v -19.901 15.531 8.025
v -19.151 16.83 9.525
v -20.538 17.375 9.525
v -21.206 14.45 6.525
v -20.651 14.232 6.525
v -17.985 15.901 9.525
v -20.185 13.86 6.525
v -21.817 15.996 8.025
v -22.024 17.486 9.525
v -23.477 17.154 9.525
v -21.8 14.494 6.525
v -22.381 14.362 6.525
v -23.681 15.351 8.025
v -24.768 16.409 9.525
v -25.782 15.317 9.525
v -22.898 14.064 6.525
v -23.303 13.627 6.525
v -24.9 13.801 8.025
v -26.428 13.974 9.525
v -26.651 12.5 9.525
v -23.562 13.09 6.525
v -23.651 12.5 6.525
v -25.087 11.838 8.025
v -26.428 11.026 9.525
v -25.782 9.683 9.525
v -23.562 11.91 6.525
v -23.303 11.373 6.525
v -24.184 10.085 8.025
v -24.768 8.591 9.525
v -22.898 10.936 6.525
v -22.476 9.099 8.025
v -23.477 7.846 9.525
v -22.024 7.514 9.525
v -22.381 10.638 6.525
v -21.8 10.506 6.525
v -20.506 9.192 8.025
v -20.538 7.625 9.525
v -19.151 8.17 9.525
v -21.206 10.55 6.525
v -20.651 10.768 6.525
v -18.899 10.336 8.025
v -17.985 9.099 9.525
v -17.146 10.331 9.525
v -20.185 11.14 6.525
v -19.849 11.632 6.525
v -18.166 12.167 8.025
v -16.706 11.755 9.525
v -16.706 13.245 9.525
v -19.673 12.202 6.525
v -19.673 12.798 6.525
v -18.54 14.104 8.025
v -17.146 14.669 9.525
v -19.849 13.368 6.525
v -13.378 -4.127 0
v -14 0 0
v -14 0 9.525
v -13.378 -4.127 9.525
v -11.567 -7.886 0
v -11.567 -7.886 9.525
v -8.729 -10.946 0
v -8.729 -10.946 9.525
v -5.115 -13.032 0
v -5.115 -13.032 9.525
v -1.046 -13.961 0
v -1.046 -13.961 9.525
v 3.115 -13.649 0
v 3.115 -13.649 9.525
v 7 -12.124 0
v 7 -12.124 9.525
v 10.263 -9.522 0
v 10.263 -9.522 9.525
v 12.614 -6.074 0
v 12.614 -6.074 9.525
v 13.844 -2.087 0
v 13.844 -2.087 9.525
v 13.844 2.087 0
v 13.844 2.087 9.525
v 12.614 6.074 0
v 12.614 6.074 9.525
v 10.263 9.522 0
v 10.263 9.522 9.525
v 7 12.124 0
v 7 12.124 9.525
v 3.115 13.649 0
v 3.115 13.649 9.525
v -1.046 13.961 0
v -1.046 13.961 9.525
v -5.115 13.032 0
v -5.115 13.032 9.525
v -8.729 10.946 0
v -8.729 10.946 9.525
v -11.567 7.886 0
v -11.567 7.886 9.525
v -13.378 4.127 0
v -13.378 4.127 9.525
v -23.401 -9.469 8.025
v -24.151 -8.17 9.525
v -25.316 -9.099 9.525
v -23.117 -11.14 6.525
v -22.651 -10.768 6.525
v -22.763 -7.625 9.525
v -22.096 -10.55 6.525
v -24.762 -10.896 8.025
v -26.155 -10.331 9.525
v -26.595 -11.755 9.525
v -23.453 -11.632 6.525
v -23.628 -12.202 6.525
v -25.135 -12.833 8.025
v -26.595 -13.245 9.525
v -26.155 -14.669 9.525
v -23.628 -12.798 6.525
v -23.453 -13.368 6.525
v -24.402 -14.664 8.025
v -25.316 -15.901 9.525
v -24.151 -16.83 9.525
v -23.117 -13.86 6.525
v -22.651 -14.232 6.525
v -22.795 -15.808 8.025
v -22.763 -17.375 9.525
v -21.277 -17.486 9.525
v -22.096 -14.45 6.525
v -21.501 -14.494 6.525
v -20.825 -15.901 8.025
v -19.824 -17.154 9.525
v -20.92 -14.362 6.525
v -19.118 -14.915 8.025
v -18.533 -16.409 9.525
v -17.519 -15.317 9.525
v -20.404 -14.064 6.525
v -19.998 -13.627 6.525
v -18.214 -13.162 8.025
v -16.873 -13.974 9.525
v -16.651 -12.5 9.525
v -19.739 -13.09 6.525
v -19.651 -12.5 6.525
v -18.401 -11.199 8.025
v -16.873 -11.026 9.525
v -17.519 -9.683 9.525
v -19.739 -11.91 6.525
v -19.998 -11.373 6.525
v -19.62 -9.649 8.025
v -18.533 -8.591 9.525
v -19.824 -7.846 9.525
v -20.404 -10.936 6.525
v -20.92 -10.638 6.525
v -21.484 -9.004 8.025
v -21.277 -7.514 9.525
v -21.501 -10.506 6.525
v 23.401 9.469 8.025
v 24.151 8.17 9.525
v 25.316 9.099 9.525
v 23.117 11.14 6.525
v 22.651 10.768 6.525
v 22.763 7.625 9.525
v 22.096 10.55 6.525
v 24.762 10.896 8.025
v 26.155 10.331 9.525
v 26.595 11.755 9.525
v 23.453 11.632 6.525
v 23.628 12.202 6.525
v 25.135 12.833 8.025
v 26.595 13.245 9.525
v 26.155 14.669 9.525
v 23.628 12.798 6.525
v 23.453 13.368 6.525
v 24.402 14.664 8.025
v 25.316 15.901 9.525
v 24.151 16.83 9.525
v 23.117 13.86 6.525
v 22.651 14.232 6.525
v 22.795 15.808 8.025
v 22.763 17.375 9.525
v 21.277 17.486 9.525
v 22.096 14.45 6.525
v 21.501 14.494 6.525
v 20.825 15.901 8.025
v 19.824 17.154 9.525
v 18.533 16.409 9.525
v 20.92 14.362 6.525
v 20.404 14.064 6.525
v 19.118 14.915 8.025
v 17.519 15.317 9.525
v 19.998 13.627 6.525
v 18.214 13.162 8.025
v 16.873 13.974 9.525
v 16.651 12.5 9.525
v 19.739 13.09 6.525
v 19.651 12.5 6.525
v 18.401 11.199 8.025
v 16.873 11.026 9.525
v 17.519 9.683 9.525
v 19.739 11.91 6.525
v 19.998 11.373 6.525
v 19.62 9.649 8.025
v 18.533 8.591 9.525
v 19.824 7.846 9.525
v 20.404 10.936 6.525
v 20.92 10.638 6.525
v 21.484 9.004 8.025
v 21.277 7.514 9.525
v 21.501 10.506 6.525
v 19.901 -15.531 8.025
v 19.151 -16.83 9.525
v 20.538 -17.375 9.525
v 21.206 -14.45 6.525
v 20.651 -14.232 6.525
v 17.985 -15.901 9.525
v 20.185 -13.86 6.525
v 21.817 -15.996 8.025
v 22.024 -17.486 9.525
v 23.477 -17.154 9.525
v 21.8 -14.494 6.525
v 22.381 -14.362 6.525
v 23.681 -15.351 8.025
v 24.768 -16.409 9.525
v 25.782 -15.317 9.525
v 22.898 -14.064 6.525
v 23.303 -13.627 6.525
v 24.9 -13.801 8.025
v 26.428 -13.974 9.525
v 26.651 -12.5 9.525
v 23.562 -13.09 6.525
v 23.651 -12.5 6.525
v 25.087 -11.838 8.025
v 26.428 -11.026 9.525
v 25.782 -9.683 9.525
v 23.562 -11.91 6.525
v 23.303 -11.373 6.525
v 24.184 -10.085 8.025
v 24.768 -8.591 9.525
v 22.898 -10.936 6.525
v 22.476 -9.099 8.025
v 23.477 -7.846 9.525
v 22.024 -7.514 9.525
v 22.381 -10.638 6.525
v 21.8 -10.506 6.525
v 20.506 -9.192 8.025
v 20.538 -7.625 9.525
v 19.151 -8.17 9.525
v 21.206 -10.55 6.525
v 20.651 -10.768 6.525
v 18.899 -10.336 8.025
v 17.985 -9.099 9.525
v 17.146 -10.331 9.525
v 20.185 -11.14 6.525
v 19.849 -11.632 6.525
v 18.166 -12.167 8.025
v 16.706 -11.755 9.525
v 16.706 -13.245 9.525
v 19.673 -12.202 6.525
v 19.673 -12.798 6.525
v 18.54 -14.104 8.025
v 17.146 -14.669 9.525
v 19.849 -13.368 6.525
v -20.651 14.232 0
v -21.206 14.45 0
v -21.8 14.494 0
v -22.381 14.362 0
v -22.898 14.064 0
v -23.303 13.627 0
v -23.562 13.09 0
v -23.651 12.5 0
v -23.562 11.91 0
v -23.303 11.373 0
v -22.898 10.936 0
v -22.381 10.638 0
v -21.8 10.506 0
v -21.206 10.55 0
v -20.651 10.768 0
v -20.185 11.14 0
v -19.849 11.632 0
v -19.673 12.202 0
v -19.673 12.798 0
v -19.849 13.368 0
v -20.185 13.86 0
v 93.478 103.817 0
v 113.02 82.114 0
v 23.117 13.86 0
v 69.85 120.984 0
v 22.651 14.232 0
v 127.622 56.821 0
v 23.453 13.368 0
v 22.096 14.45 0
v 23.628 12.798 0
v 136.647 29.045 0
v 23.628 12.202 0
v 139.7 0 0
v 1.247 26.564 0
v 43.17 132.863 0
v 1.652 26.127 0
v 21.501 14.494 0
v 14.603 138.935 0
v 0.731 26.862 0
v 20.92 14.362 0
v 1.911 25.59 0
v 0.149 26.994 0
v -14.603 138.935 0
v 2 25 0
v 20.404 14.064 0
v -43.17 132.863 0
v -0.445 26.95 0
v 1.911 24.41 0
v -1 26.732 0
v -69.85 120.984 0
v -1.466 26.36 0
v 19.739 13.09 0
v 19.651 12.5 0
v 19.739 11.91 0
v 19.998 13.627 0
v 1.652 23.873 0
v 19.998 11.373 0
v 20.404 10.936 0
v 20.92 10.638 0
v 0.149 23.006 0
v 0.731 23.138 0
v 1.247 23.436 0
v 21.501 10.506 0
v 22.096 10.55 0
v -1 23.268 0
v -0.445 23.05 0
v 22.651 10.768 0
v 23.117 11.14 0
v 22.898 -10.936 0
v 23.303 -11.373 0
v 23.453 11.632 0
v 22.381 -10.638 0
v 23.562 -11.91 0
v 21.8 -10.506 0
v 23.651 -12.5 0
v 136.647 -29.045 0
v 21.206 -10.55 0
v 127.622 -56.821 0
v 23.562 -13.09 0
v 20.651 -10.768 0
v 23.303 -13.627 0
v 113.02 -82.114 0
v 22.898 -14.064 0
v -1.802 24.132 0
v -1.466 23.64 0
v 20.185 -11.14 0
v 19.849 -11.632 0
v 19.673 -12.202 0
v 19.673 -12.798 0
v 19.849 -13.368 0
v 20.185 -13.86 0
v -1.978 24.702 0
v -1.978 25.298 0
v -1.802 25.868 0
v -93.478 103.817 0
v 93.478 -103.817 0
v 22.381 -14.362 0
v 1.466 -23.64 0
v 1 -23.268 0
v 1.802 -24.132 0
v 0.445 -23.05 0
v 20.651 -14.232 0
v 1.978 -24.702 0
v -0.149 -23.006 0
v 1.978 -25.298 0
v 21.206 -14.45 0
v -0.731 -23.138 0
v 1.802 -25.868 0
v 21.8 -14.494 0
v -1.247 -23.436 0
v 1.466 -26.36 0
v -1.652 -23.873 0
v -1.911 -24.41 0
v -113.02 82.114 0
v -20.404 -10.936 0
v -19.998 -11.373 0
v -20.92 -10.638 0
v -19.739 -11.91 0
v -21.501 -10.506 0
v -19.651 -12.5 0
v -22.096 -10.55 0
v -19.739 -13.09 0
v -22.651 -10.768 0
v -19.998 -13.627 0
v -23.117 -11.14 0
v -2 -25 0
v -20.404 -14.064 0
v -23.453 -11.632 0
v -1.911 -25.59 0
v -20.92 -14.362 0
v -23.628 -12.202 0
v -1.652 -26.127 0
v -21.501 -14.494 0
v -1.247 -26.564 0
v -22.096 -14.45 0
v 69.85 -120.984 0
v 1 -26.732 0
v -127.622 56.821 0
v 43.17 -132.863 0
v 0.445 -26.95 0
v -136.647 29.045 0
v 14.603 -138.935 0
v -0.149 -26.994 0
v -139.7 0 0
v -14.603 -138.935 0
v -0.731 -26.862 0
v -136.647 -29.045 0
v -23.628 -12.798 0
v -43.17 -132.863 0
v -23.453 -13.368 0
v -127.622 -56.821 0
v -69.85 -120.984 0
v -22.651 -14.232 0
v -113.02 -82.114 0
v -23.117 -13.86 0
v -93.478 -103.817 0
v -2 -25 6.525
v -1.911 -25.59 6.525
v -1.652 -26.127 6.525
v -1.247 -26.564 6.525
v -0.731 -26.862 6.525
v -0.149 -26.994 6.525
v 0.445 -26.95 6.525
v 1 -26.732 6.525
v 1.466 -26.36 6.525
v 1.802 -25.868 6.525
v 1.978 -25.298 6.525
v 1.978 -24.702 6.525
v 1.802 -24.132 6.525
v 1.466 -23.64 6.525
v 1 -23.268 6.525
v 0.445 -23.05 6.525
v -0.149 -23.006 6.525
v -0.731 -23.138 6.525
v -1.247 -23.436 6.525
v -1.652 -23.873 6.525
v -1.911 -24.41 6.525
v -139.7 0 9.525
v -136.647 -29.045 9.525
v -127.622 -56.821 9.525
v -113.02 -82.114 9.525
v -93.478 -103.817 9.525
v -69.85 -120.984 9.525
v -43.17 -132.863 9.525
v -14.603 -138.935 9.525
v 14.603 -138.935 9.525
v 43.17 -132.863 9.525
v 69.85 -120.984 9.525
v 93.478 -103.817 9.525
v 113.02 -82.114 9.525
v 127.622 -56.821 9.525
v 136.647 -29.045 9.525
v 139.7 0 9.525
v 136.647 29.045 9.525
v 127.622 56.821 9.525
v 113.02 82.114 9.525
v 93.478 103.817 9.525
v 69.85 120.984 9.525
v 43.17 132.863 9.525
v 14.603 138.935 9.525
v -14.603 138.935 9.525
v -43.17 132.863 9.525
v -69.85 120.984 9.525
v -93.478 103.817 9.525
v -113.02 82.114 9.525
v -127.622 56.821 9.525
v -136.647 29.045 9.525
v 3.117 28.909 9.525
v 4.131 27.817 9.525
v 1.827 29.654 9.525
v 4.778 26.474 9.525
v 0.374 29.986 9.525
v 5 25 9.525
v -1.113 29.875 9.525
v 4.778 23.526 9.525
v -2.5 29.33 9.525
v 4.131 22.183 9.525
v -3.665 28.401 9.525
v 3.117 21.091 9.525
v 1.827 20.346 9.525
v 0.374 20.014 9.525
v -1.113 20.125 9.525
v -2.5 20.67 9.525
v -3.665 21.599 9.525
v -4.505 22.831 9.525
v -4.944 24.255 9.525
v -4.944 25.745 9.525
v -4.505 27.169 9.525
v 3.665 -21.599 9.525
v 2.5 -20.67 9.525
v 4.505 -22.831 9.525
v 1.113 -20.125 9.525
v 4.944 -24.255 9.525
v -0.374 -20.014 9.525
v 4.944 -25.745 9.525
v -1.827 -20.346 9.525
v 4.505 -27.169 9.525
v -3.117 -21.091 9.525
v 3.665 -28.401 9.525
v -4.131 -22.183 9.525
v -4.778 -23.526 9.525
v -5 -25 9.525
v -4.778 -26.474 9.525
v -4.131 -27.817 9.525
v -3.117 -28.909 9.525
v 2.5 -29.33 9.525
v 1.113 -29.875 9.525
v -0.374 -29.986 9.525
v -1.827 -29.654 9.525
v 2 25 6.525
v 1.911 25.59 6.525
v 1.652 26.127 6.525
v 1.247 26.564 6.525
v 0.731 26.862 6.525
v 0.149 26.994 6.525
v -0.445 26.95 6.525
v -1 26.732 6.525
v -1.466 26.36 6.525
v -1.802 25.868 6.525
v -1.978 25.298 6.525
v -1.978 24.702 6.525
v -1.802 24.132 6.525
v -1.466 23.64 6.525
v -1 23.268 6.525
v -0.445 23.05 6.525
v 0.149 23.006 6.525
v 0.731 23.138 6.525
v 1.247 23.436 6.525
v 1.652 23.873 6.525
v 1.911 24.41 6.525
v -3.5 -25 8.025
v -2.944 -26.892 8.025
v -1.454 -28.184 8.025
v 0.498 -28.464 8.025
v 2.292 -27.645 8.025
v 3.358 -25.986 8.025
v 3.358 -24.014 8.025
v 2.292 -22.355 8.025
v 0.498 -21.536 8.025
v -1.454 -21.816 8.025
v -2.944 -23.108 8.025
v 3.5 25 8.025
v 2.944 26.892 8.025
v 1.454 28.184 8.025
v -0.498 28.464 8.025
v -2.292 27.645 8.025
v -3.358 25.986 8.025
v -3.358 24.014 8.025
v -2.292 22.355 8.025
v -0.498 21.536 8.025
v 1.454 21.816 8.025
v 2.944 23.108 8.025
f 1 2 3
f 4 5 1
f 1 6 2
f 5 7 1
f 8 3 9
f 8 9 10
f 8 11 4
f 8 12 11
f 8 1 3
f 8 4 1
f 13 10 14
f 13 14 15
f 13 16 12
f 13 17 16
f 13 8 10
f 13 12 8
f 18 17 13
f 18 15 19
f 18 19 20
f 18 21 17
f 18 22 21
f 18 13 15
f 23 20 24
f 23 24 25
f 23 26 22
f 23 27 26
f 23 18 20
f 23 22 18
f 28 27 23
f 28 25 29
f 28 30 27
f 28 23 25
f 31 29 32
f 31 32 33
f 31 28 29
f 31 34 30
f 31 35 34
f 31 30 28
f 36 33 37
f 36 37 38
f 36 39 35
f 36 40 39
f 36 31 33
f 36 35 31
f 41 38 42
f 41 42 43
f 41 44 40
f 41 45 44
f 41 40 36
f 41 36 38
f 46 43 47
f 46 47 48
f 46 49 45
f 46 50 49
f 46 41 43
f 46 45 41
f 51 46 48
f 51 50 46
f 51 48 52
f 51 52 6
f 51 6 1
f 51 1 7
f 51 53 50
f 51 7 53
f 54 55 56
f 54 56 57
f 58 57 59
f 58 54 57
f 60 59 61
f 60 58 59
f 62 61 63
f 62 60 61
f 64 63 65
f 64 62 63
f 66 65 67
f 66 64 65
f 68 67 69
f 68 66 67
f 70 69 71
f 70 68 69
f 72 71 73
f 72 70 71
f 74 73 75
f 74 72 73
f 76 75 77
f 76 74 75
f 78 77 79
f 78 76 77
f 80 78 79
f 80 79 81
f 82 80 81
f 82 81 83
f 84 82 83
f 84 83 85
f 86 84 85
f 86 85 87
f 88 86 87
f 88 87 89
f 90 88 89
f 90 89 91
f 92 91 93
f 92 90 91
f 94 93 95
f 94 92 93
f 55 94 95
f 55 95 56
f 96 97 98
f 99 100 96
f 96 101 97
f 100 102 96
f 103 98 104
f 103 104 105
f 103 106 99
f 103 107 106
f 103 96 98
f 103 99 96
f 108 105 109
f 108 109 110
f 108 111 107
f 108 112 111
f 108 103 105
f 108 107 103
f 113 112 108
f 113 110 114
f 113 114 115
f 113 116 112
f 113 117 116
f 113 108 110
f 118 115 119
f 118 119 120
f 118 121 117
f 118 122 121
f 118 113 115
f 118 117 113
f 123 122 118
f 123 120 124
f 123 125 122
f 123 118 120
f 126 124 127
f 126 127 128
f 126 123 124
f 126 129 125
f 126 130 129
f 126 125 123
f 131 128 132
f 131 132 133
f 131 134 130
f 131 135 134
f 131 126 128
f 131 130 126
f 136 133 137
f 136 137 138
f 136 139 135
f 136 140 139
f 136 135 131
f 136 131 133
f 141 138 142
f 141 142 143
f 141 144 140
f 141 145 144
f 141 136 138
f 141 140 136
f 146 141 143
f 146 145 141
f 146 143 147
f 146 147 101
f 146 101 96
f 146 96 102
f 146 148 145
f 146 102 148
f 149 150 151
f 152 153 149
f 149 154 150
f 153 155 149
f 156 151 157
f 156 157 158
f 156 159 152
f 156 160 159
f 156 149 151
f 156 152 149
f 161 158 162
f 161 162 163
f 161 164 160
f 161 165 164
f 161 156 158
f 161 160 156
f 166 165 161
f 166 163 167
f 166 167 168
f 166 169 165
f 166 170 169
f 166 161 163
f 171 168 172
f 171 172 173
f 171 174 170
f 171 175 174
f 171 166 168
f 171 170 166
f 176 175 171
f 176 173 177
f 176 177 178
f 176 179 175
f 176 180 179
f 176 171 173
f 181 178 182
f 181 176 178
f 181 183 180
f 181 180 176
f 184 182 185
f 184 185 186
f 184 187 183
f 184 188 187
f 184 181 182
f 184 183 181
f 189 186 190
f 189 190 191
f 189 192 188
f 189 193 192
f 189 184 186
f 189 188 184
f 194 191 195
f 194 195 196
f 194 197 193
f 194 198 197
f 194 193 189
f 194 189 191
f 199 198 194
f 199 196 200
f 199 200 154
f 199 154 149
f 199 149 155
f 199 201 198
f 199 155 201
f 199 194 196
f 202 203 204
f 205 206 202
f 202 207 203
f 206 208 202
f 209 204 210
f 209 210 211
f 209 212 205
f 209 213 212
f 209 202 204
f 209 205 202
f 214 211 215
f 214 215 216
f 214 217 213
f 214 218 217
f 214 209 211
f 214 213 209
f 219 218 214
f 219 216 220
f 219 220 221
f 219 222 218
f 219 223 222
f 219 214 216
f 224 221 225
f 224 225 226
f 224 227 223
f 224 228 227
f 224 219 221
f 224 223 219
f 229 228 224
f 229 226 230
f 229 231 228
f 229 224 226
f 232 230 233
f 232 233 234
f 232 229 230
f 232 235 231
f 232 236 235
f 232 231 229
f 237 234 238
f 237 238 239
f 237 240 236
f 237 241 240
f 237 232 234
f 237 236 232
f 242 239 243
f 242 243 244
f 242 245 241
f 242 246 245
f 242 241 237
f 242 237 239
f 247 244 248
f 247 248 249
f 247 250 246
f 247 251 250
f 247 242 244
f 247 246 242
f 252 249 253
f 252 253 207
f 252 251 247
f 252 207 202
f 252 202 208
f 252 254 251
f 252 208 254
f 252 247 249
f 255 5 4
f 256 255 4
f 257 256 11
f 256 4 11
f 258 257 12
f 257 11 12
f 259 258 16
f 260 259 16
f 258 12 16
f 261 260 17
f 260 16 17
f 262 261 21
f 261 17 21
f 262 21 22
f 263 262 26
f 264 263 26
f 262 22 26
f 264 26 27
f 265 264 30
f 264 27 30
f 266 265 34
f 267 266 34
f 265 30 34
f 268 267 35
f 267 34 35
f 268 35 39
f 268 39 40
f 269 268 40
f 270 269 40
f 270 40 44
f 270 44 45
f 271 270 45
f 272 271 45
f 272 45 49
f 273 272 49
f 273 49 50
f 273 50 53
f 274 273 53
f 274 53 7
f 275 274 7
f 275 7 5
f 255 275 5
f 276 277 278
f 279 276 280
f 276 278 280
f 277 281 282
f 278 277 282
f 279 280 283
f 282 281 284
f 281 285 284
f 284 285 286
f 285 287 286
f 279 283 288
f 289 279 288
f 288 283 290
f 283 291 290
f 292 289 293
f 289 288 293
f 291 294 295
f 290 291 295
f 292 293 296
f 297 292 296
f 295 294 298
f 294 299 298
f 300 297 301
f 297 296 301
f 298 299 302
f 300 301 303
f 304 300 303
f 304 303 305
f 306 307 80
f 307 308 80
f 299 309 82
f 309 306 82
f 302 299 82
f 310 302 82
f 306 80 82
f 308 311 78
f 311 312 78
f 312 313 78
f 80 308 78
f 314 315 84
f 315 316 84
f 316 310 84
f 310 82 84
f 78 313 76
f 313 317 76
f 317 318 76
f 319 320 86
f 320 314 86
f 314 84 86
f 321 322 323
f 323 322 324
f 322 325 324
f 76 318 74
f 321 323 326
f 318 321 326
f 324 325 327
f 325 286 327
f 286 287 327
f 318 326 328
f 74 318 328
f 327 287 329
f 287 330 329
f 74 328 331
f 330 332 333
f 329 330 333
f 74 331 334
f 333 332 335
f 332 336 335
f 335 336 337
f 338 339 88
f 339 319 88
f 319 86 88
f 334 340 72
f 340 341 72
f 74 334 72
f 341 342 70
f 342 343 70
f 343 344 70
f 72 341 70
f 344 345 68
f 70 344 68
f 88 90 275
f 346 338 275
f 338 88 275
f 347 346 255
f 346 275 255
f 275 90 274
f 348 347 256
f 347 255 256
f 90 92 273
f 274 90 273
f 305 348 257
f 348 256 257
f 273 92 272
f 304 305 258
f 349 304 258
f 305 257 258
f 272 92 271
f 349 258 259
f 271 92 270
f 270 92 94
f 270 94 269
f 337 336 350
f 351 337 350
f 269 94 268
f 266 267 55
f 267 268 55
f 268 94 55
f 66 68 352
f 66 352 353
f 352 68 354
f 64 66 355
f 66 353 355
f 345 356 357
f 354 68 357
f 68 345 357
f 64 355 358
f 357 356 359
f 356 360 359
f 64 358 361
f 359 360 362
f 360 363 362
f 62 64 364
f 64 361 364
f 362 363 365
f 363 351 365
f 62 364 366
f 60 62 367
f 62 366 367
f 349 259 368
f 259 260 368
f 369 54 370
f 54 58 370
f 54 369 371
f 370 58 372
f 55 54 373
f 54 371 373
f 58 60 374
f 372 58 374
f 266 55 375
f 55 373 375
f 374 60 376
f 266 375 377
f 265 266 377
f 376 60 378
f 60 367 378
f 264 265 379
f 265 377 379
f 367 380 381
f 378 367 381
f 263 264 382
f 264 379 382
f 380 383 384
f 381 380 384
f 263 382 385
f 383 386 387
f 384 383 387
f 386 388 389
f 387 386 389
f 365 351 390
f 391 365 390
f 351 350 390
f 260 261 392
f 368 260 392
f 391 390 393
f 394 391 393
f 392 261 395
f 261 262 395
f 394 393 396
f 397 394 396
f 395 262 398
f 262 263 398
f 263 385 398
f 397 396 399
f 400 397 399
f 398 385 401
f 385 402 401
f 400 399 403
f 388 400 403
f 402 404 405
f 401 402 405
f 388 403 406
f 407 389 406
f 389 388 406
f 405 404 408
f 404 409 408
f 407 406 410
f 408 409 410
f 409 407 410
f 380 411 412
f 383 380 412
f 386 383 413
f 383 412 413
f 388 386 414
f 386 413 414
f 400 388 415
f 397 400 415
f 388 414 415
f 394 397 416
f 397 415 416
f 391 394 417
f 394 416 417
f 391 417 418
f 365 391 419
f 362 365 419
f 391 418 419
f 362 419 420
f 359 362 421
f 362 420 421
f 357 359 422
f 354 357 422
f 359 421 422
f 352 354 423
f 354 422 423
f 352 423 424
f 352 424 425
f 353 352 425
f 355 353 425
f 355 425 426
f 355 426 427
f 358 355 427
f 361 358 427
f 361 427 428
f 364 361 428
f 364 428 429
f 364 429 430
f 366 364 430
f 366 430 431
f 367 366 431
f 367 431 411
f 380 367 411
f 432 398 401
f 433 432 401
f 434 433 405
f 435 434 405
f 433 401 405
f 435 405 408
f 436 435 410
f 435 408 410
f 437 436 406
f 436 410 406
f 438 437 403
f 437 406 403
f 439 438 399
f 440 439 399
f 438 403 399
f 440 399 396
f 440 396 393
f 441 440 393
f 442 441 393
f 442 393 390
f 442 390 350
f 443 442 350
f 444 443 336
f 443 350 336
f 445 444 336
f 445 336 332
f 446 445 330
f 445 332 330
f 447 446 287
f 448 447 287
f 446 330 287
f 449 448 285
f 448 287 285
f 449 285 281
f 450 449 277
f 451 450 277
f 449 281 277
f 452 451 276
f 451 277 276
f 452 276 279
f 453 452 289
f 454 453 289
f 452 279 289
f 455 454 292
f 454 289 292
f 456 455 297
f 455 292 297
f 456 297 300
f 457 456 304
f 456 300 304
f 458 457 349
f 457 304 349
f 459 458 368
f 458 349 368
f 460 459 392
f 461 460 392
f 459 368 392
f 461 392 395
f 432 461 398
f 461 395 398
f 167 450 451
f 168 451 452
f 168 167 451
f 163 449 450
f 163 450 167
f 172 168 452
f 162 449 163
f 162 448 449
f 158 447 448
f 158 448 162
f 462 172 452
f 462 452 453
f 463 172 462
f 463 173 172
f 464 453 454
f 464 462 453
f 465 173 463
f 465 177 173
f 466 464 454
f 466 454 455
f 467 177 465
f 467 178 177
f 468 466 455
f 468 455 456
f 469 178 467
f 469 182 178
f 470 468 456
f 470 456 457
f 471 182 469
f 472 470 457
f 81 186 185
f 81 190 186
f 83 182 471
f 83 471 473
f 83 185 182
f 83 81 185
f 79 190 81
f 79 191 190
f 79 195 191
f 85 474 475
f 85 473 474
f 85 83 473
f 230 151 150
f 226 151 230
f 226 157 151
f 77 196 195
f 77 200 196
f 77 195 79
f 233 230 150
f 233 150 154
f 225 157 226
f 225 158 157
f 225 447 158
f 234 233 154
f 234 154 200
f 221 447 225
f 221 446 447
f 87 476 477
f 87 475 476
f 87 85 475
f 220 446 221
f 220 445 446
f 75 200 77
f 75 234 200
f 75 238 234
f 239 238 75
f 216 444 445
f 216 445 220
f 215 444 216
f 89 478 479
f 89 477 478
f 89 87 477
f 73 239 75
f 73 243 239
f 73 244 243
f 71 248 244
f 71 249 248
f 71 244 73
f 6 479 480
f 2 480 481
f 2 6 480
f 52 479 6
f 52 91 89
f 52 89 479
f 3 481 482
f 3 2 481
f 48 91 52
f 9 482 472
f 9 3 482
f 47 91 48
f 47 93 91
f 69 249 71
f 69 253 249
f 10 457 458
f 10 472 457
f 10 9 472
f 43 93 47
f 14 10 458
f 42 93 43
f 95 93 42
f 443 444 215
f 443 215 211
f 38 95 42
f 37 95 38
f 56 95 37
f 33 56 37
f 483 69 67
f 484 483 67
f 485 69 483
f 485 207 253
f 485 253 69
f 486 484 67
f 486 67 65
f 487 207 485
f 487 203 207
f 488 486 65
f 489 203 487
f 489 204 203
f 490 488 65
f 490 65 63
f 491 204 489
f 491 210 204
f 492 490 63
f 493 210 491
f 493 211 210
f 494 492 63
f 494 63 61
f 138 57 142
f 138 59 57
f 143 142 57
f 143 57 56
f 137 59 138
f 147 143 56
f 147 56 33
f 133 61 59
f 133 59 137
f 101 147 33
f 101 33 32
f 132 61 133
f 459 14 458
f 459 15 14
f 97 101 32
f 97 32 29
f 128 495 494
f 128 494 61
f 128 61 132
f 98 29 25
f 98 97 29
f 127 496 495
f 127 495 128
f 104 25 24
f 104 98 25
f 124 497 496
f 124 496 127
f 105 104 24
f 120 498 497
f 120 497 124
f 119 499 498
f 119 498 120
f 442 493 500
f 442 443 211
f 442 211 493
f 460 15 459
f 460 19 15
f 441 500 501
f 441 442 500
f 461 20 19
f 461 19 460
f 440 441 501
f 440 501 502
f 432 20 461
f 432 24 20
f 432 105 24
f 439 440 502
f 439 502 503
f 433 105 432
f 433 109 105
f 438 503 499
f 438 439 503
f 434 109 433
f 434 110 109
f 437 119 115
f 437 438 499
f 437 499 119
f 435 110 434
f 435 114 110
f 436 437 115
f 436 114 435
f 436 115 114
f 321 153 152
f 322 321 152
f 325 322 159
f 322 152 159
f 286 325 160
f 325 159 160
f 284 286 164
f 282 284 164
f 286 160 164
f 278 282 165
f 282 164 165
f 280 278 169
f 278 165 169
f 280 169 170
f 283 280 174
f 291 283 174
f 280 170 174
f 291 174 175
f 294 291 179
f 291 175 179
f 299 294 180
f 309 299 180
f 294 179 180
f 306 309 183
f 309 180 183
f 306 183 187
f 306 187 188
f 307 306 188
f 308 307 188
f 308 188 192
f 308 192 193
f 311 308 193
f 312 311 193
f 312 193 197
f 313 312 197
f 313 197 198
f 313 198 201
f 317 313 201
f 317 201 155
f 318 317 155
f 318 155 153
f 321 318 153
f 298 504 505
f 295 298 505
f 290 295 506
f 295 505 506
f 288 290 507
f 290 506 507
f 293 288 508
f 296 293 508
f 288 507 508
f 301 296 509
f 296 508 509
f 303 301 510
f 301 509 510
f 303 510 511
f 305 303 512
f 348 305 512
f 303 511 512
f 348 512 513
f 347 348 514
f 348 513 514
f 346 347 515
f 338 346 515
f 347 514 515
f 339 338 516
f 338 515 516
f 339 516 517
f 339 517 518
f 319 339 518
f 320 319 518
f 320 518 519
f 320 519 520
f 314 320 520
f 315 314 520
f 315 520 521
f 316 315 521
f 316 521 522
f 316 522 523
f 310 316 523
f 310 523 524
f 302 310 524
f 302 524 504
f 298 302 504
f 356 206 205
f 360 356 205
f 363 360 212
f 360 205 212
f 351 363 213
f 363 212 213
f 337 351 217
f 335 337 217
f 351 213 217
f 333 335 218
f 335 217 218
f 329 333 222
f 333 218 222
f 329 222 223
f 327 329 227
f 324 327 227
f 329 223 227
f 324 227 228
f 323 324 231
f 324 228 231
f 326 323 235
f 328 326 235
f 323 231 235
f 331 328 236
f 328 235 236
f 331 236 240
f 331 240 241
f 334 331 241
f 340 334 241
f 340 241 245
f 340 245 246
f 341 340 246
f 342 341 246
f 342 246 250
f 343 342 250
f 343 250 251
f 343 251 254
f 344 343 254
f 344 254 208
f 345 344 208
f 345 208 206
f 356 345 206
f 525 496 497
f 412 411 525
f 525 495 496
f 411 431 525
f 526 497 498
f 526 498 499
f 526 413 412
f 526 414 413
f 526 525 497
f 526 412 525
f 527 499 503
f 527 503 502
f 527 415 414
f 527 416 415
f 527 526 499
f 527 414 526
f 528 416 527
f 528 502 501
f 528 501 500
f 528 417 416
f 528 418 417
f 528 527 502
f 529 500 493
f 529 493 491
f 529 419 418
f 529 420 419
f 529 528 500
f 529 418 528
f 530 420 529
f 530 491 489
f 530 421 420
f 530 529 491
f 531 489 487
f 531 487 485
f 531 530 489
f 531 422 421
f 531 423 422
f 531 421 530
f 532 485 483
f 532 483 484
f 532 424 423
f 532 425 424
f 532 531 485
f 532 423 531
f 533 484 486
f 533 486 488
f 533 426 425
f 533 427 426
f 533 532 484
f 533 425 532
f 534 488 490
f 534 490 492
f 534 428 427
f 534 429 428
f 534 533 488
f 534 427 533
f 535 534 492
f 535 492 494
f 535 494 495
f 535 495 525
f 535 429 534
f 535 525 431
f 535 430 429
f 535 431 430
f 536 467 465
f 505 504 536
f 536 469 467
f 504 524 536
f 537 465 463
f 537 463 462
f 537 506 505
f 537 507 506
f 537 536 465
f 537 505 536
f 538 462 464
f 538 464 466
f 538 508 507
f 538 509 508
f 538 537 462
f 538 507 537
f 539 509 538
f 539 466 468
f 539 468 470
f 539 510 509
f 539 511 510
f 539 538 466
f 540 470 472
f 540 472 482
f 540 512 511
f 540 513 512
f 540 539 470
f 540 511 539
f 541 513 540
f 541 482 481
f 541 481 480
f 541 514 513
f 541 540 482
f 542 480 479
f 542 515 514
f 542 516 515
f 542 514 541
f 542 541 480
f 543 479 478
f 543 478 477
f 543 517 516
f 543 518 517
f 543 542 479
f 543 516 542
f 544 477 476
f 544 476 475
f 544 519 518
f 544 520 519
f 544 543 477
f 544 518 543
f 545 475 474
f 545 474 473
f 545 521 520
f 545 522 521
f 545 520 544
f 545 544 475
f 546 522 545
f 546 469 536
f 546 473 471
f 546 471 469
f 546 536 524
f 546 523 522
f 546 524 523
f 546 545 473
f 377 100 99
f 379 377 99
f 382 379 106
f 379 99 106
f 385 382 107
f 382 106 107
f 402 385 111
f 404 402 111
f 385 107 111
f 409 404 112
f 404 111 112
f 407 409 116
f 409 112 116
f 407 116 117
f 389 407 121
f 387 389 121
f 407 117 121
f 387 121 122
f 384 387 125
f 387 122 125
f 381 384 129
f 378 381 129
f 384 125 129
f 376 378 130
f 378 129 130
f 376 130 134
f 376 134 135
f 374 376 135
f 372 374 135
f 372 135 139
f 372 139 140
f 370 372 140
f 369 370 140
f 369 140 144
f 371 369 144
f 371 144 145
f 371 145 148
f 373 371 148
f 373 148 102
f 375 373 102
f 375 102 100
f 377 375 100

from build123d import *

# Parameters (mm, degrees)
SKETCH1_R           = 139.7
SKETCH1_R_2         = 14
BOSS_EXTRUDE1_DEPTH = 9.525
SKETCH2_R           = 2
CUT_EXTRUDE1_DEPTH  = 198.795110215
CIRPATTERN1_COUNT   = 6
CHAMFER1_SIZE       = 3


with BuildPart() as part:
    # Sketch1 → Boss-Extrude1 (new body)
    with BuildSketch(Plane.XY):
        with Locations(Location((0, 0, 0), (0, 0, 180))):
            Circle(SKETCH1_R)
        with Locations(Location((0, 0, 0), (0, 0, 180))):
            Circle(SKETCH1_R_2, mode=Mode.SUBTRACT)
    extrude(amount=BOSS_EXTRUDE1_DEPTH)

    # Sketch2 → Cut-Extrude1 (cut, through all)
    with BuildSketch(Plane.XY.offset(9.525)):
        with Locations((0, 25)):
            Circle(SKETCH2_R)
    cut_extrude1 = extrude(amount=-CUT_EXTRUDE1_DEPTH, mode=Mode.SUBTRACT)

    # CirPattern1: Cut-Extrude1 ×6 about axis
    cirpattern1_axis = Axis((0, 0, 0), (0, 0, 1))
    for i in range(1, CIRPATTERN1_COUNT):
        add(cut_extrude1.rotate(cirpattern1_axis, i * 360 / CIRPATTERN1_COUNT), mode=Mode.SUBTRACT)

    # Chamfer1
    chamfer1_edges = [part.edges().sort_by_distance(p)[0] for p in [
        (-2, 25, 9.525),
        (-22.650635095, 10.767949192, 9.525),
        (-20.650635095, -14.232050808, 9.525),
        (2, -25, 9.525),
        (22.650635095, -10.767949192, 9.525),
        (20.650635095, 14.232050808, 9.525),
    ]]
    chamfer(chamfer1_edges, length=CHAMFER1_SIZE)


solid = part.part
